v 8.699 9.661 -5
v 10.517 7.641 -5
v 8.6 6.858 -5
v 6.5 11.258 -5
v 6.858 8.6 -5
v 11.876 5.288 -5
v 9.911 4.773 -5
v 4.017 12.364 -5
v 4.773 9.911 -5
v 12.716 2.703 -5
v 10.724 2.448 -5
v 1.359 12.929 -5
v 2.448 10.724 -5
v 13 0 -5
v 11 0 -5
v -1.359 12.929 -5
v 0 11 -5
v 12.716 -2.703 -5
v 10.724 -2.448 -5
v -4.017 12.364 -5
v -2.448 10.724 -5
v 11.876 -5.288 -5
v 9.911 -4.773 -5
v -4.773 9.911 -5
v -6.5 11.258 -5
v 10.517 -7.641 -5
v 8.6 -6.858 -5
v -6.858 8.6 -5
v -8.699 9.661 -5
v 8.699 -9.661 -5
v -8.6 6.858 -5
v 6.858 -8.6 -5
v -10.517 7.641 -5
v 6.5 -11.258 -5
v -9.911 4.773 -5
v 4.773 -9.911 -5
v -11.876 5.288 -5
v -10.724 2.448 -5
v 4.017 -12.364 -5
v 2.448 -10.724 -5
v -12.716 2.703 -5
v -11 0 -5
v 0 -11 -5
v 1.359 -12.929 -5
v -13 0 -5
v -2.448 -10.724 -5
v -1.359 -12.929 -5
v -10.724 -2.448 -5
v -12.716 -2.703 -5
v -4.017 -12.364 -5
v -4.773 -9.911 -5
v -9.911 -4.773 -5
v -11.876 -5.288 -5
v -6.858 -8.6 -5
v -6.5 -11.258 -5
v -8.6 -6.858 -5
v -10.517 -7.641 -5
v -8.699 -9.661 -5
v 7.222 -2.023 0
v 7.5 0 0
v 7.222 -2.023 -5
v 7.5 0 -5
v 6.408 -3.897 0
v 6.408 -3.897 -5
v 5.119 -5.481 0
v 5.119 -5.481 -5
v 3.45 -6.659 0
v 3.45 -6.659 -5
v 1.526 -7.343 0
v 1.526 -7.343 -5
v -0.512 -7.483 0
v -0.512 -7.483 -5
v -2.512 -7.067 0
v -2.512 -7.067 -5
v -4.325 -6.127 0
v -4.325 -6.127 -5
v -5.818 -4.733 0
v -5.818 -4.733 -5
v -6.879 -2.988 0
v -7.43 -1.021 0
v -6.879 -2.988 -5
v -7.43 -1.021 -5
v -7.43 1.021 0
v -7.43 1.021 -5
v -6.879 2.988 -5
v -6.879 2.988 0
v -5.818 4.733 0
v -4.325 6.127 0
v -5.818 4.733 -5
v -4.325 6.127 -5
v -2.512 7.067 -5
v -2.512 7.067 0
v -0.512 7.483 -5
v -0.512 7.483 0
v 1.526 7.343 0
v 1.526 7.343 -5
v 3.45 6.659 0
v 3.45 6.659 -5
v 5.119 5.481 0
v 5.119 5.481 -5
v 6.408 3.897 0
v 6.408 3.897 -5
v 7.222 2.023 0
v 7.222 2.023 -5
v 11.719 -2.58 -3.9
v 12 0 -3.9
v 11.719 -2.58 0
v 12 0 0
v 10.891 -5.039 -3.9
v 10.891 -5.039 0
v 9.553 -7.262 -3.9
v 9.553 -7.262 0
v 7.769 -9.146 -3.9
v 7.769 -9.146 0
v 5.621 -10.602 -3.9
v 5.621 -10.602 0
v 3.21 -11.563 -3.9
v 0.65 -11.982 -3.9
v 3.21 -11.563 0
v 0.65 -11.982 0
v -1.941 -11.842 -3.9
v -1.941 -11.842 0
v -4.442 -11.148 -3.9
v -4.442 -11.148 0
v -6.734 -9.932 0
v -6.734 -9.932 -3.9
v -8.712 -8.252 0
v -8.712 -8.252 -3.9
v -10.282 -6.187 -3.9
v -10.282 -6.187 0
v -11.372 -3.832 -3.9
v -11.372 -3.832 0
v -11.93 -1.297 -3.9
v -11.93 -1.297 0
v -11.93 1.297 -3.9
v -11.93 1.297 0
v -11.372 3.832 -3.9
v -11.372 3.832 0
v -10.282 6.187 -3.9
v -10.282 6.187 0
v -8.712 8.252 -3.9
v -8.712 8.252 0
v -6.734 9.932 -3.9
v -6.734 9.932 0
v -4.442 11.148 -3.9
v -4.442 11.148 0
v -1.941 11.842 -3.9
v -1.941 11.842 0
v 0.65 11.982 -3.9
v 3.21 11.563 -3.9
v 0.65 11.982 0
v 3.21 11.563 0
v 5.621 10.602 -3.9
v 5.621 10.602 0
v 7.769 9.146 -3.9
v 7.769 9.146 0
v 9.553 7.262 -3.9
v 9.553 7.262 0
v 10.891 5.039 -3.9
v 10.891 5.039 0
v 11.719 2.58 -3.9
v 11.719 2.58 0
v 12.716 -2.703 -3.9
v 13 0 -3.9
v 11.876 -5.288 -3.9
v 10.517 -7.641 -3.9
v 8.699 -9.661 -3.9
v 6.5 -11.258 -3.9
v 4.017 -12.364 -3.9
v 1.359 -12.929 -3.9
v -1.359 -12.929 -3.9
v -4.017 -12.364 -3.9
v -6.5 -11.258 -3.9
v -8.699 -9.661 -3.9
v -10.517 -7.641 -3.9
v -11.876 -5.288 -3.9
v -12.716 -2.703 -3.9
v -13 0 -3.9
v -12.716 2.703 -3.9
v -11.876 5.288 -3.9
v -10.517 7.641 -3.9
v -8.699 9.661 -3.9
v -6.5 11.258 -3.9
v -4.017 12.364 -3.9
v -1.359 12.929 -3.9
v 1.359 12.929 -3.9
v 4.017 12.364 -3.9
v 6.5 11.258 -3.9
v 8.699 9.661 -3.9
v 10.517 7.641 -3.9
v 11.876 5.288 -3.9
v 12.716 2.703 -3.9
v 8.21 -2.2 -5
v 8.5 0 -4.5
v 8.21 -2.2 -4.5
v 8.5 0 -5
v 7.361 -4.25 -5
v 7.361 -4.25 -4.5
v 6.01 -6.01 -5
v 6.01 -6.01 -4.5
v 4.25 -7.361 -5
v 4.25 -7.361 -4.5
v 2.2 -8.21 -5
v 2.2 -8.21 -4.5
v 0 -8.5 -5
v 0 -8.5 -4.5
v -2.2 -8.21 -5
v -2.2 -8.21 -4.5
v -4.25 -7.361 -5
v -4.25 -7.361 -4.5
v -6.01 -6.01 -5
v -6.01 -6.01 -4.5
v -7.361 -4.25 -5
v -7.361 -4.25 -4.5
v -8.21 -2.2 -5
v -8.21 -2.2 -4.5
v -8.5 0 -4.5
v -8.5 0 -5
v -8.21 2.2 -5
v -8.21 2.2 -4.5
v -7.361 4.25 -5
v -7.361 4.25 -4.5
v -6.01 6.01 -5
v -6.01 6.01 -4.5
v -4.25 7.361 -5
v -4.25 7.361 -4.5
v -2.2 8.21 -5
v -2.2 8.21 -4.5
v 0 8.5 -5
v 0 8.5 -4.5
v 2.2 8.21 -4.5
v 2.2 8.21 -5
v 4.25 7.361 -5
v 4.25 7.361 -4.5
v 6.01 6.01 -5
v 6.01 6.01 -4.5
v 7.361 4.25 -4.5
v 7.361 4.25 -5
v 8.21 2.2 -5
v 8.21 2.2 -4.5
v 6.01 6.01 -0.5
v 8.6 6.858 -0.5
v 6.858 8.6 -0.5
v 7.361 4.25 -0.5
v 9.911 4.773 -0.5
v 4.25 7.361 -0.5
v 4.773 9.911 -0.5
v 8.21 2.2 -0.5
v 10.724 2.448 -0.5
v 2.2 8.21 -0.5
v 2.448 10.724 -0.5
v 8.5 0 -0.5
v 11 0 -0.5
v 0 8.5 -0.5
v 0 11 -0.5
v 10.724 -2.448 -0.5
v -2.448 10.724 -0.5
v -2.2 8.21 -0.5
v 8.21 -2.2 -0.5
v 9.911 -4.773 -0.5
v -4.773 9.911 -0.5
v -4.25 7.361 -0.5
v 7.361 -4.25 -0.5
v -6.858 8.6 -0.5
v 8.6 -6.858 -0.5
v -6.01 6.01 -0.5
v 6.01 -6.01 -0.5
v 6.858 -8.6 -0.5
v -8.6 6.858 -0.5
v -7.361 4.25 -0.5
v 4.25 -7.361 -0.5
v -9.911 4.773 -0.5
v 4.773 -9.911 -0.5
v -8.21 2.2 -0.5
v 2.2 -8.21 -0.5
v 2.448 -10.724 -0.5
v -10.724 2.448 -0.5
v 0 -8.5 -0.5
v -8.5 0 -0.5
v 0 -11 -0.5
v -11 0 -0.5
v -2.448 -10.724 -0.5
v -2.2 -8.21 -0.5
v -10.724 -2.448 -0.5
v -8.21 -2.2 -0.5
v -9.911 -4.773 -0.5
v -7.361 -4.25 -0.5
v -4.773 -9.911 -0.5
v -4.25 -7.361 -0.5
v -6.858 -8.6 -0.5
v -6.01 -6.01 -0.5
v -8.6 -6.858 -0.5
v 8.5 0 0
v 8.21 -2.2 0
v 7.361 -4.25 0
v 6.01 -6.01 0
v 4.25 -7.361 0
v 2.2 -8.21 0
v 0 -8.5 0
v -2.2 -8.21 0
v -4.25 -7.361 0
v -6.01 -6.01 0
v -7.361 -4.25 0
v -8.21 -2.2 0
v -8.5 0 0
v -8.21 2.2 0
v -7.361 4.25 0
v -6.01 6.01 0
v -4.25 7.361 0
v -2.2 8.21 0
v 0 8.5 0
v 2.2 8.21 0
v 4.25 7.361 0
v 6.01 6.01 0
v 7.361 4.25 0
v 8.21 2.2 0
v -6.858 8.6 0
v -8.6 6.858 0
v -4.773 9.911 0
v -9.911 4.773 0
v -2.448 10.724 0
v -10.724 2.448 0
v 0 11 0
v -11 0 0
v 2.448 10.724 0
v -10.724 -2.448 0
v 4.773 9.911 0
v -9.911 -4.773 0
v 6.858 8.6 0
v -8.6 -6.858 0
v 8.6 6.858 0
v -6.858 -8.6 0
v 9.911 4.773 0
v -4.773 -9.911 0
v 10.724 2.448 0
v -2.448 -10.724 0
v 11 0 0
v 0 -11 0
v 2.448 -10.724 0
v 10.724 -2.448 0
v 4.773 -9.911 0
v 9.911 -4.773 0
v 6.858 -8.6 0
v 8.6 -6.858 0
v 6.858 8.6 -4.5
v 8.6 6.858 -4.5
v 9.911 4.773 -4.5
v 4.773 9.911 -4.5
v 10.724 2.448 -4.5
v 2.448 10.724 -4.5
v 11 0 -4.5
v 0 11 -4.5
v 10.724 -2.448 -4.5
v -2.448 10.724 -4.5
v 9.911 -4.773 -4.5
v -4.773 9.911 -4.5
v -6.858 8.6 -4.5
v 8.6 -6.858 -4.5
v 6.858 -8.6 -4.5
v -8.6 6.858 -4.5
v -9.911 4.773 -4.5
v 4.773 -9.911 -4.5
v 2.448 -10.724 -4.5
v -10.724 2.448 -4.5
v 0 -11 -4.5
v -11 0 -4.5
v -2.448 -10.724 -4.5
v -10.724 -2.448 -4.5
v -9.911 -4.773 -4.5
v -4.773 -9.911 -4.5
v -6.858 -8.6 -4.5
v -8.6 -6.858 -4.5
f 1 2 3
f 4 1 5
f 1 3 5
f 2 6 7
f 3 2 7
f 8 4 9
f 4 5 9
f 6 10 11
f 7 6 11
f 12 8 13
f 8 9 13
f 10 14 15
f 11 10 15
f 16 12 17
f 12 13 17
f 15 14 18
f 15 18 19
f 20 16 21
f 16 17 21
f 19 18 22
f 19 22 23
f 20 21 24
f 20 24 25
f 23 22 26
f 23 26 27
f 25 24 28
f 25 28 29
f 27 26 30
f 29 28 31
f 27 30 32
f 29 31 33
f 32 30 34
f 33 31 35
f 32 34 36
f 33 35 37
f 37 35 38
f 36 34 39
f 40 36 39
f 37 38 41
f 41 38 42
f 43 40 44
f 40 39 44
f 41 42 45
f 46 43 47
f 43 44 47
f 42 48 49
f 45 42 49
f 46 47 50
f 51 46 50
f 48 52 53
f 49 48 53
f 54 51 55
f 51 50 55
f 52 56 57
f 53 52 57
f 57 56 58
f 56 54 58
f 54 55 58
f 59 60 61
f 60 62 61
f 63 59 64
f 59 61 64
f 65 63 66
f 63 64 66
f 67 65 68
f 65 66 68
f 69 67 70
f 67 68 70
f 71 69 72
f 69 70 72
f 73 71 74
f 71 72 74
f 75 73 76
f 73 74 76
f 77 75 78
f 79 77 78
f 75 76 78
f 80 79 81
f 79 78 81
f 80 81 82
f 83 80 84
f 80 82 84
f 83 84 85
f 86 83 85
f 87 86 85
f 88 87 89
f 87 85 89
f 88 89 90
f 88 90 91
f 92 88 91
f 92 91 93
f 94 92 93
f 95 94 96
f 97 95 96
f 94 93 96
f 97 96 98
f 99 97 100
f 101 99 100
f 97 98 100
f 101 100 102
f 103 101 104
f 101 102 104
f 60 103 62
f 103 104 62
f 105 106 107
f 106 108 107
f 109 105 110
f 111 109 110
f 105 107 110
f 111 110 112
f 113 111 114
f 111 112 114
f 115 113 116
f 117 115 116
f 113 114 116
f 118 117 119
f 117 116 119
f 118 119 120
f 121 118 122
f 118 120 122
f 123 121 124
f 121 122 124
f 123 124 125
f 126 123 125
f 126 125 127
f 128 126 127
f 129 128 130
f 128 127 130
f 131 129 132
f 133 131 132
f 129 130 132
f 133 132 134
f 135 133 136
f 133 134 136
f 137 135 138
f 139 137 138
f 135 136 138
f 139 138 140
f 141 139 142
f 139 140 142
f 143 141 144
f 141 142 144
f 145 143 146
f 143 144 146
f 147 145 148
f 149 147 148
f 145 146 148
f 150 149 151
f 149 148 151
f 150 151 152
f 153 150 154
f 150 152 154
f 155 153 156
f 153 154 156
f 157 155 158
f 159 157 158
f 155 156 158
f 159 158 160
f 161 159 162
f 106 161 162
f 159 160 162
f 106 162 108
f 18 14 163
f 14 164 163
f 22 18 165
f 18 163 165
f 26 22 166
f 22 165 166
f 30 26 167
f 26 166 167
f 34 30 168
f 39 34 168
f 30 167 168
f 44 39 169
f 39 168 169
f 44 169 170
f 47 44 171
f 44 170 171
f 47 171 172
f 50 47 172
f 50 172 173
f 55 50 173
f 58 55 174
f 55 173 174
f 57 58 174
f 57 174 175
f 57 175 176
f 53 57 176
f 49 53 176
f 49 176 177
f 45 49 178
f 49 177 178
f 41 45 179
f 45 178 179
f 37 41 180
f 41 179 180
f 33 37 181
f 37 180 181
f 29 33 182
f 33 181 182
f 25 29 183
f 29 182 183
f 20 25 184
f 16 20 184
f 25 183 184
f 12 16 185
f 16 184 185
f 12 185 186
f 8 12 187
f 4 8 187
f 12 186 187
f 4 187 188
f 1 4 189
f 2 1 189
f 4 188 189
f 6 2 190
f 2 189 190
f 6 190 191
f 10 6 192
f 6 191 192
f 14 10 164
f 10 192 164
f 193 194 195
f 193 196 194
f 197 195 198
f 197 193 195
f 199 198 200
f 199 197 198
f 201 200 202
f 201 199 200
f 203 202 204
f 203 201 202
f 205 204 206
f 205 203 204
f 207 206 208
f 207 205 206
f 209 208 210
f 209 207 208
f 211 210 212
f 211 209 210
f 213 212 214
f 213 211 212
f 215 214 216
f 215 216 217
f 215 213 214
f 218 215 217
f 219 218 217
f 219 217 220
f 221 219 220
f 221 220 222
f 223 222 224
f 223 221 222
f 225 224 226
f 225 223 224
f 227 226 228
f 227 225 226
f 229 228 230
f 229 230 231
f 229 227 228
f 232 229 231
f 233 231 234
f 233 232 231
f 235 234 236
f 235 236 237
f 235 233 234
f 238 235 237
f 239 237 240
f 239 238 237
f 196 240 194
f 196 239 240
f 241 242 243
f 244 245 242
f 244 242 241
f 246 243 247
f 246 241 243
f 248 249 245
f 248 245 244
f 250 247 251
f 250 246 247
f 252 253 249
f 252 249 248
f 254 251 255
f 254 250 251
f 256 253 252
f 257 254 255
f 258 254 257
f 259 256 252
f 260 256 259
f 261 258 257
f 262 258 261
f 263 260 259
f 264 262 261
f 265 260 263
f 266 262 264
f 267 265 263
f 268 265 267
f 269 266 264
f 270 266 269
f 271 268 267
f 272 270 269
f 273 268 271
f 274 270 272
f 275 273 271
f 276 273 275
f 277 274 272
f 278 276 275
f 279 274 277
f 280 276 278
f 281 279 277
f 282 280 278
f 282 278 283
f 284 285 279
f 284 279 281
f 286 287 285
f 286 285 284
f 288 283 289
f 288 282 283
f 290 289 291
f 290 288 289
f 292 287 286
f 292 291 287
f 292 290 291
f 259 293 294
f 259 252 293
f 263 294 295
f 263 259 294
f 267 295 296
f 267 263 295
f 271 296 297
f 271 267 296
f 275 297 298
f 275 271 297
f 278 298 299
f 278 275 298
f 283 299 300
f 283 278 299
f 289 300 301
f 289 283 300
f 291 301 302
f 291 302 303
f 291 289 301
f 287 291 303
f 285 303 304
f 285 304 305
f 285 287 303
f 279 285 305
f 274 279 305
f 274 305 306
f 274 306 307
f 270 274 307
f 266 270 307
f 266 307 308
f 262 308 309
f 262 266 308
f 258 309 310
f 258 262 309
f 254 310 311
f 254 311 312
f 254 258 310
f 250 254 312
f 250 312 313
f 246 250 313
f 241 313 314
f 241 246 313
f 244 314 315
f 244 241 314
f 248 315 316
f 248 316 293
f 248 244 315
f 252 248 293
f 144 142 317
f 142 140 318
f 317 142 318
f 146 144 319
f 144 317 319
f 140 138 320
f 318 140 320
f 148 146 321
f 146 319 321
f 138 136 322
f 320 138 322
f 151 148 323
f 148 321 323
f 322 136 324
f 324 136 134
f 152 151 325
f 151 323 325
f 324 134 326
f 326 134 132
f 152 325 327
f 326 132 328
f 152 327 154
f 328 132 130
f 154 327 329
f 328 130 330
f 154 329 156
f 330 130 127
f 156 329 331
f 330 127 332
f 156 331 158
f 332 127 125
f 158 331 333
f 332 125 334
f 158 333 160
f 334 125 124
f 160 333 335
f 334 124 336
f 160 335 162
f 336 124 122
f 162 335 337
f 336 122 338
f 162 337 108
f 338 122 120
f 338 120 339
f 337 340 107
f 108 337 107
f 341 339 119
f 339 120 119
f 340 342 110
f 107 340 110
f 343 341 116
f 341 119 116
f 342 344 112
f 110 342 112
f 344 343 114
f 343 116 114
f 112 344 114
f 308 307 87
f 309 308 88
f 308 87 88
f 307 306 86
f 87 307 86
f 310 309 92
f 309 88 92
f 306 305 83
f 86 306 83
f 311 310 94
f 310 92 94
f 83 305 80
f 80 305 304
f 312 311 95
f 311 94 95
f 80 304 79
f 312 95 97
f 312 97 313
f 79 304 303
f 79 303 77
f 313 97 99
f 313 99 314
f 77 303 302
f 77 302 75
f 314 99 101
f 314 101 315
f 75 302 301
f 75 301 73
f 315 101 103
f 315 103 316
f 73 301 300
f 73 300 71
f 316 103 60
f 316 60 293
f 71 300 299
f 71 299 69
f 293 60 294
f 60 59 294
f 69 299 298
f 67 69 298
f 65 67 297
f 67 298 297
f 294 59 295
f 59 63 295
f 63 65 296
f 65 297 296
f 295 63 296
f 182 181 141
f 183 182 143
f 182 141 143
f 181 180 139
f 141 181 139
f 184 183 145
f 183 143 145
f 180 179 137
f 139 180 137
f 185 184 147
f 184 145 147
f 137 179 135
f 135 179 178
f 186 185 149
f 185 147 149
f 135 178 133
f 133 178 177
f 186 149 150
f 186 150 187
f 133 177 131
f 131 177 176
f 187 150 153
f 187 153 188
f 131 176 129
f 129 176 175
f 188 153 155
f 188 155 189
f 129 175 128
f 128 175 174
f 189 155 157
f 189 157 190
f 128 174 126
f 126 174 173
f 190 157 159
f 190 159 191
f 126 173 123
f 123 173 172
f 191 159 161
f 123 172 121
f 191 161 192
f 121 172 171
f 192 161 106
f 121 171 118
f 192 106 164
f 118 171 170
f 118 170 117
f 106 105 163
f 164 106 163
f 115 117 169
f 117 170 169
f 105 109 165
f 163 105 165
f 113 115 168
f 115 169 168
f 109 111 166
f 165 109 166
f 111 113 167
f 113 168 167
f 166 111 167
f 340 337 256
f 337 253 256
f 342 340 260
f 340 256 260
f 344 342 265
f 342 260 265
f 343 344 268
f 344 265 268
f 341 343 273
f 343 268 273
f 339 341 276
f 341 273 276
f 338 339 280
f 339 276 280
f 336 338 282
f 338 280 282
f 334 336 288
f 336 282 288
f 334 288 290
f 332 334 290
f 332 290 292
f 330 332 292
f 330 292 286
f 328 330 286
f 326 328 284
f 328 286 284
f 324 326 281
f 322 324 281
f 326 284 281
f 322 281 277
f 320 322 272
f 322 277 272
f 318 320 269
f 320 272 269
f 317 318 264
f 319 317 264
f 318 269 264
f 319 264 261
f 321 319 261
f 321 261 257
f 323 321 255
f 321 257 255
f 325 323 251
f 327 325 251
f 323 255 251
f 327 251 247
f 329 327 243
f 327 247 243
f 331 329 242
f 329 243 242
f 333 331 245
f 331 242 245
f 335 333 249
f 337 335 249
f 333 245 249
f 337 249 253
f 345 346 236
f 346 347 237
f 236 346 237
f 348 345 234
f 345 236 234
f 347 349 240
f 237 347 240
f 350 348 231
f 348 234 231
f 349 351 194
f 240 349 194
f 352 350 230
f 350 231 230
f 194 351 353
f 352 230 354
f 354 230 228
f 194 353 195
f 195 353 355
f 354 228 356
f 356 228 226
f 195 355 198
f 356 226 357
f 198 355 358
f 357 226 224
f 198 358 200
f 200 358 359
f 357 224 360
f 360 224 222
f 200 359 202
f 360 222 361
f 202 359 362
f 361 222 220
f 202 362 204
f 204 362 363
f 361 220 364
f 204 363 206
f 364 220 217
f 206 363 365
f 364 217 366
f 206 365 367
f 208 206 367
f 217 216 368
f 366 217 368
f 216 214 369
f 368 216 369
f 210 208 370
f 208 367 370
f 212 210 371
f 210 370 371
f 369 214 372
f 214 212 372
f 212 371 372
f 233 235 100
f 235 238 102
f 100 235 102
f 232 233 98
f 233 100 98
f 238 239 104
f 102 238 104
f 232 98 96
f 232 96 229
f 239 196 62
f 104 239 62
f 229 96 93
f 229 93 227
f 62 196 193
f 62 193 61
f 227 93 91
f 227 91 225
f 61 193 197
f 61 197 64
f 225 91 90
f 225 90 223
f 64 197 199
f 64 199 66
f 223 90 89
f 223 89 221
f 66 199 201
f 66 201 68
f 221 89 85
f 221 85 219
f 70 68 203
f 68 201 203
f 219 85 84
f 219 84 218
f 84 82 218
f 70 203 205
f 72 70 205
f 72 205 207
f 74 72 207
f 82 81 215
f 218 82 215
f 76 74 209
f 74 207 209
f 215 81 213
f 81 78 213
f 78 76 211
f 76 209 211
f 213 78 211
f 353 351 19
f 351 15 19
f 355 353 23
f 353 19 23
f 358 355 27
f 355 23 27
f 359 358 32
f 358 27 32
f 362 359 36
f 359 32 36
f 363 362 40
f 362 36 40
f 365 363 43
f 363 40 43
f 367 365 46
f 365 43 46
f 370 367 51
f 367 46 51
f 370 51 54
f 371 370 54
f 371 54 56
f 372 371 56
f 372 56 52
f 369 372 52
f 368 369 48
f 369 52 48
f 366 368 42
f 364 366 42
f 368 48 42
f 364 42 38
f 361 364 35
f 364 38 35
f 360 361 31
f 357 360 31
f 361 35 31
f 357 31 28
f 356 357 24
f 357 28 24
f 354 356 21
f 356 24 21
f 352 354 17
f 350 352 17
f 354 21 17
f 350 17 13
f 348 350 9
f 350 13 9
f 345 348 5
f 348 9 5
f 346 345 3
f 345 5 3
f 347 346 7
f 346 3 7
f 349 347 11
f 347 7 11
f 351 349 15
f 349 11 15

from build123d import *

# Parameters (mm, degrees)
SKETCH_2_W = 0.5
SKETCH_2_H = 2.5


with BuildPart() as part:
    # ｽｹｯﾁ1 → 回転1 (revolve)
    with BuildSketch(Plane(origin=(0, 0, 0), x_dir=(0, 0, -1), z_dir=(1, 0, 0)), mode=Mode.PRIVATE) as revolve_1_sk:
        Polygon((0, 7.5), (5, 7.5), (5, 13), (3.9, 13), (3.9, 12), (0, 12), align=None)
    revolve(revolve_1_sk.sketch.rotate(Axis((0, 0, 0), (0, 0, -1)), 90), axis=Axis((0, 0, 0), (0, 0, -1)))

    # ｽｹｯﾁ2 → ｶｯﾄ - 回転1 (revolve, cut)
    with BuildSketch(Plane(origin=(0, 0, 0), x_dir=(0, 0, -1), z_dir=(1, 0, 0)), mode=Mode.PRIVATE) as cut_revolve_1_sk:
        with Locations((0.25, 9.75)):
            Rectangle(SKETCH_2_W, SKETCH_2_H)
        with Locations((4.75, 9.75)):
            Rectangle(SKETCH_2_W, SKETCH_2_H)
    revolve(cut_revolve_1_sk.sketch.rotate(Axis((0, 0, 0), (0, 0, -1)), 90), axis=Axis((0, 0, 0), (0, 0, -1)), mode=Mode.SUBTRACT)


solid = part.part
